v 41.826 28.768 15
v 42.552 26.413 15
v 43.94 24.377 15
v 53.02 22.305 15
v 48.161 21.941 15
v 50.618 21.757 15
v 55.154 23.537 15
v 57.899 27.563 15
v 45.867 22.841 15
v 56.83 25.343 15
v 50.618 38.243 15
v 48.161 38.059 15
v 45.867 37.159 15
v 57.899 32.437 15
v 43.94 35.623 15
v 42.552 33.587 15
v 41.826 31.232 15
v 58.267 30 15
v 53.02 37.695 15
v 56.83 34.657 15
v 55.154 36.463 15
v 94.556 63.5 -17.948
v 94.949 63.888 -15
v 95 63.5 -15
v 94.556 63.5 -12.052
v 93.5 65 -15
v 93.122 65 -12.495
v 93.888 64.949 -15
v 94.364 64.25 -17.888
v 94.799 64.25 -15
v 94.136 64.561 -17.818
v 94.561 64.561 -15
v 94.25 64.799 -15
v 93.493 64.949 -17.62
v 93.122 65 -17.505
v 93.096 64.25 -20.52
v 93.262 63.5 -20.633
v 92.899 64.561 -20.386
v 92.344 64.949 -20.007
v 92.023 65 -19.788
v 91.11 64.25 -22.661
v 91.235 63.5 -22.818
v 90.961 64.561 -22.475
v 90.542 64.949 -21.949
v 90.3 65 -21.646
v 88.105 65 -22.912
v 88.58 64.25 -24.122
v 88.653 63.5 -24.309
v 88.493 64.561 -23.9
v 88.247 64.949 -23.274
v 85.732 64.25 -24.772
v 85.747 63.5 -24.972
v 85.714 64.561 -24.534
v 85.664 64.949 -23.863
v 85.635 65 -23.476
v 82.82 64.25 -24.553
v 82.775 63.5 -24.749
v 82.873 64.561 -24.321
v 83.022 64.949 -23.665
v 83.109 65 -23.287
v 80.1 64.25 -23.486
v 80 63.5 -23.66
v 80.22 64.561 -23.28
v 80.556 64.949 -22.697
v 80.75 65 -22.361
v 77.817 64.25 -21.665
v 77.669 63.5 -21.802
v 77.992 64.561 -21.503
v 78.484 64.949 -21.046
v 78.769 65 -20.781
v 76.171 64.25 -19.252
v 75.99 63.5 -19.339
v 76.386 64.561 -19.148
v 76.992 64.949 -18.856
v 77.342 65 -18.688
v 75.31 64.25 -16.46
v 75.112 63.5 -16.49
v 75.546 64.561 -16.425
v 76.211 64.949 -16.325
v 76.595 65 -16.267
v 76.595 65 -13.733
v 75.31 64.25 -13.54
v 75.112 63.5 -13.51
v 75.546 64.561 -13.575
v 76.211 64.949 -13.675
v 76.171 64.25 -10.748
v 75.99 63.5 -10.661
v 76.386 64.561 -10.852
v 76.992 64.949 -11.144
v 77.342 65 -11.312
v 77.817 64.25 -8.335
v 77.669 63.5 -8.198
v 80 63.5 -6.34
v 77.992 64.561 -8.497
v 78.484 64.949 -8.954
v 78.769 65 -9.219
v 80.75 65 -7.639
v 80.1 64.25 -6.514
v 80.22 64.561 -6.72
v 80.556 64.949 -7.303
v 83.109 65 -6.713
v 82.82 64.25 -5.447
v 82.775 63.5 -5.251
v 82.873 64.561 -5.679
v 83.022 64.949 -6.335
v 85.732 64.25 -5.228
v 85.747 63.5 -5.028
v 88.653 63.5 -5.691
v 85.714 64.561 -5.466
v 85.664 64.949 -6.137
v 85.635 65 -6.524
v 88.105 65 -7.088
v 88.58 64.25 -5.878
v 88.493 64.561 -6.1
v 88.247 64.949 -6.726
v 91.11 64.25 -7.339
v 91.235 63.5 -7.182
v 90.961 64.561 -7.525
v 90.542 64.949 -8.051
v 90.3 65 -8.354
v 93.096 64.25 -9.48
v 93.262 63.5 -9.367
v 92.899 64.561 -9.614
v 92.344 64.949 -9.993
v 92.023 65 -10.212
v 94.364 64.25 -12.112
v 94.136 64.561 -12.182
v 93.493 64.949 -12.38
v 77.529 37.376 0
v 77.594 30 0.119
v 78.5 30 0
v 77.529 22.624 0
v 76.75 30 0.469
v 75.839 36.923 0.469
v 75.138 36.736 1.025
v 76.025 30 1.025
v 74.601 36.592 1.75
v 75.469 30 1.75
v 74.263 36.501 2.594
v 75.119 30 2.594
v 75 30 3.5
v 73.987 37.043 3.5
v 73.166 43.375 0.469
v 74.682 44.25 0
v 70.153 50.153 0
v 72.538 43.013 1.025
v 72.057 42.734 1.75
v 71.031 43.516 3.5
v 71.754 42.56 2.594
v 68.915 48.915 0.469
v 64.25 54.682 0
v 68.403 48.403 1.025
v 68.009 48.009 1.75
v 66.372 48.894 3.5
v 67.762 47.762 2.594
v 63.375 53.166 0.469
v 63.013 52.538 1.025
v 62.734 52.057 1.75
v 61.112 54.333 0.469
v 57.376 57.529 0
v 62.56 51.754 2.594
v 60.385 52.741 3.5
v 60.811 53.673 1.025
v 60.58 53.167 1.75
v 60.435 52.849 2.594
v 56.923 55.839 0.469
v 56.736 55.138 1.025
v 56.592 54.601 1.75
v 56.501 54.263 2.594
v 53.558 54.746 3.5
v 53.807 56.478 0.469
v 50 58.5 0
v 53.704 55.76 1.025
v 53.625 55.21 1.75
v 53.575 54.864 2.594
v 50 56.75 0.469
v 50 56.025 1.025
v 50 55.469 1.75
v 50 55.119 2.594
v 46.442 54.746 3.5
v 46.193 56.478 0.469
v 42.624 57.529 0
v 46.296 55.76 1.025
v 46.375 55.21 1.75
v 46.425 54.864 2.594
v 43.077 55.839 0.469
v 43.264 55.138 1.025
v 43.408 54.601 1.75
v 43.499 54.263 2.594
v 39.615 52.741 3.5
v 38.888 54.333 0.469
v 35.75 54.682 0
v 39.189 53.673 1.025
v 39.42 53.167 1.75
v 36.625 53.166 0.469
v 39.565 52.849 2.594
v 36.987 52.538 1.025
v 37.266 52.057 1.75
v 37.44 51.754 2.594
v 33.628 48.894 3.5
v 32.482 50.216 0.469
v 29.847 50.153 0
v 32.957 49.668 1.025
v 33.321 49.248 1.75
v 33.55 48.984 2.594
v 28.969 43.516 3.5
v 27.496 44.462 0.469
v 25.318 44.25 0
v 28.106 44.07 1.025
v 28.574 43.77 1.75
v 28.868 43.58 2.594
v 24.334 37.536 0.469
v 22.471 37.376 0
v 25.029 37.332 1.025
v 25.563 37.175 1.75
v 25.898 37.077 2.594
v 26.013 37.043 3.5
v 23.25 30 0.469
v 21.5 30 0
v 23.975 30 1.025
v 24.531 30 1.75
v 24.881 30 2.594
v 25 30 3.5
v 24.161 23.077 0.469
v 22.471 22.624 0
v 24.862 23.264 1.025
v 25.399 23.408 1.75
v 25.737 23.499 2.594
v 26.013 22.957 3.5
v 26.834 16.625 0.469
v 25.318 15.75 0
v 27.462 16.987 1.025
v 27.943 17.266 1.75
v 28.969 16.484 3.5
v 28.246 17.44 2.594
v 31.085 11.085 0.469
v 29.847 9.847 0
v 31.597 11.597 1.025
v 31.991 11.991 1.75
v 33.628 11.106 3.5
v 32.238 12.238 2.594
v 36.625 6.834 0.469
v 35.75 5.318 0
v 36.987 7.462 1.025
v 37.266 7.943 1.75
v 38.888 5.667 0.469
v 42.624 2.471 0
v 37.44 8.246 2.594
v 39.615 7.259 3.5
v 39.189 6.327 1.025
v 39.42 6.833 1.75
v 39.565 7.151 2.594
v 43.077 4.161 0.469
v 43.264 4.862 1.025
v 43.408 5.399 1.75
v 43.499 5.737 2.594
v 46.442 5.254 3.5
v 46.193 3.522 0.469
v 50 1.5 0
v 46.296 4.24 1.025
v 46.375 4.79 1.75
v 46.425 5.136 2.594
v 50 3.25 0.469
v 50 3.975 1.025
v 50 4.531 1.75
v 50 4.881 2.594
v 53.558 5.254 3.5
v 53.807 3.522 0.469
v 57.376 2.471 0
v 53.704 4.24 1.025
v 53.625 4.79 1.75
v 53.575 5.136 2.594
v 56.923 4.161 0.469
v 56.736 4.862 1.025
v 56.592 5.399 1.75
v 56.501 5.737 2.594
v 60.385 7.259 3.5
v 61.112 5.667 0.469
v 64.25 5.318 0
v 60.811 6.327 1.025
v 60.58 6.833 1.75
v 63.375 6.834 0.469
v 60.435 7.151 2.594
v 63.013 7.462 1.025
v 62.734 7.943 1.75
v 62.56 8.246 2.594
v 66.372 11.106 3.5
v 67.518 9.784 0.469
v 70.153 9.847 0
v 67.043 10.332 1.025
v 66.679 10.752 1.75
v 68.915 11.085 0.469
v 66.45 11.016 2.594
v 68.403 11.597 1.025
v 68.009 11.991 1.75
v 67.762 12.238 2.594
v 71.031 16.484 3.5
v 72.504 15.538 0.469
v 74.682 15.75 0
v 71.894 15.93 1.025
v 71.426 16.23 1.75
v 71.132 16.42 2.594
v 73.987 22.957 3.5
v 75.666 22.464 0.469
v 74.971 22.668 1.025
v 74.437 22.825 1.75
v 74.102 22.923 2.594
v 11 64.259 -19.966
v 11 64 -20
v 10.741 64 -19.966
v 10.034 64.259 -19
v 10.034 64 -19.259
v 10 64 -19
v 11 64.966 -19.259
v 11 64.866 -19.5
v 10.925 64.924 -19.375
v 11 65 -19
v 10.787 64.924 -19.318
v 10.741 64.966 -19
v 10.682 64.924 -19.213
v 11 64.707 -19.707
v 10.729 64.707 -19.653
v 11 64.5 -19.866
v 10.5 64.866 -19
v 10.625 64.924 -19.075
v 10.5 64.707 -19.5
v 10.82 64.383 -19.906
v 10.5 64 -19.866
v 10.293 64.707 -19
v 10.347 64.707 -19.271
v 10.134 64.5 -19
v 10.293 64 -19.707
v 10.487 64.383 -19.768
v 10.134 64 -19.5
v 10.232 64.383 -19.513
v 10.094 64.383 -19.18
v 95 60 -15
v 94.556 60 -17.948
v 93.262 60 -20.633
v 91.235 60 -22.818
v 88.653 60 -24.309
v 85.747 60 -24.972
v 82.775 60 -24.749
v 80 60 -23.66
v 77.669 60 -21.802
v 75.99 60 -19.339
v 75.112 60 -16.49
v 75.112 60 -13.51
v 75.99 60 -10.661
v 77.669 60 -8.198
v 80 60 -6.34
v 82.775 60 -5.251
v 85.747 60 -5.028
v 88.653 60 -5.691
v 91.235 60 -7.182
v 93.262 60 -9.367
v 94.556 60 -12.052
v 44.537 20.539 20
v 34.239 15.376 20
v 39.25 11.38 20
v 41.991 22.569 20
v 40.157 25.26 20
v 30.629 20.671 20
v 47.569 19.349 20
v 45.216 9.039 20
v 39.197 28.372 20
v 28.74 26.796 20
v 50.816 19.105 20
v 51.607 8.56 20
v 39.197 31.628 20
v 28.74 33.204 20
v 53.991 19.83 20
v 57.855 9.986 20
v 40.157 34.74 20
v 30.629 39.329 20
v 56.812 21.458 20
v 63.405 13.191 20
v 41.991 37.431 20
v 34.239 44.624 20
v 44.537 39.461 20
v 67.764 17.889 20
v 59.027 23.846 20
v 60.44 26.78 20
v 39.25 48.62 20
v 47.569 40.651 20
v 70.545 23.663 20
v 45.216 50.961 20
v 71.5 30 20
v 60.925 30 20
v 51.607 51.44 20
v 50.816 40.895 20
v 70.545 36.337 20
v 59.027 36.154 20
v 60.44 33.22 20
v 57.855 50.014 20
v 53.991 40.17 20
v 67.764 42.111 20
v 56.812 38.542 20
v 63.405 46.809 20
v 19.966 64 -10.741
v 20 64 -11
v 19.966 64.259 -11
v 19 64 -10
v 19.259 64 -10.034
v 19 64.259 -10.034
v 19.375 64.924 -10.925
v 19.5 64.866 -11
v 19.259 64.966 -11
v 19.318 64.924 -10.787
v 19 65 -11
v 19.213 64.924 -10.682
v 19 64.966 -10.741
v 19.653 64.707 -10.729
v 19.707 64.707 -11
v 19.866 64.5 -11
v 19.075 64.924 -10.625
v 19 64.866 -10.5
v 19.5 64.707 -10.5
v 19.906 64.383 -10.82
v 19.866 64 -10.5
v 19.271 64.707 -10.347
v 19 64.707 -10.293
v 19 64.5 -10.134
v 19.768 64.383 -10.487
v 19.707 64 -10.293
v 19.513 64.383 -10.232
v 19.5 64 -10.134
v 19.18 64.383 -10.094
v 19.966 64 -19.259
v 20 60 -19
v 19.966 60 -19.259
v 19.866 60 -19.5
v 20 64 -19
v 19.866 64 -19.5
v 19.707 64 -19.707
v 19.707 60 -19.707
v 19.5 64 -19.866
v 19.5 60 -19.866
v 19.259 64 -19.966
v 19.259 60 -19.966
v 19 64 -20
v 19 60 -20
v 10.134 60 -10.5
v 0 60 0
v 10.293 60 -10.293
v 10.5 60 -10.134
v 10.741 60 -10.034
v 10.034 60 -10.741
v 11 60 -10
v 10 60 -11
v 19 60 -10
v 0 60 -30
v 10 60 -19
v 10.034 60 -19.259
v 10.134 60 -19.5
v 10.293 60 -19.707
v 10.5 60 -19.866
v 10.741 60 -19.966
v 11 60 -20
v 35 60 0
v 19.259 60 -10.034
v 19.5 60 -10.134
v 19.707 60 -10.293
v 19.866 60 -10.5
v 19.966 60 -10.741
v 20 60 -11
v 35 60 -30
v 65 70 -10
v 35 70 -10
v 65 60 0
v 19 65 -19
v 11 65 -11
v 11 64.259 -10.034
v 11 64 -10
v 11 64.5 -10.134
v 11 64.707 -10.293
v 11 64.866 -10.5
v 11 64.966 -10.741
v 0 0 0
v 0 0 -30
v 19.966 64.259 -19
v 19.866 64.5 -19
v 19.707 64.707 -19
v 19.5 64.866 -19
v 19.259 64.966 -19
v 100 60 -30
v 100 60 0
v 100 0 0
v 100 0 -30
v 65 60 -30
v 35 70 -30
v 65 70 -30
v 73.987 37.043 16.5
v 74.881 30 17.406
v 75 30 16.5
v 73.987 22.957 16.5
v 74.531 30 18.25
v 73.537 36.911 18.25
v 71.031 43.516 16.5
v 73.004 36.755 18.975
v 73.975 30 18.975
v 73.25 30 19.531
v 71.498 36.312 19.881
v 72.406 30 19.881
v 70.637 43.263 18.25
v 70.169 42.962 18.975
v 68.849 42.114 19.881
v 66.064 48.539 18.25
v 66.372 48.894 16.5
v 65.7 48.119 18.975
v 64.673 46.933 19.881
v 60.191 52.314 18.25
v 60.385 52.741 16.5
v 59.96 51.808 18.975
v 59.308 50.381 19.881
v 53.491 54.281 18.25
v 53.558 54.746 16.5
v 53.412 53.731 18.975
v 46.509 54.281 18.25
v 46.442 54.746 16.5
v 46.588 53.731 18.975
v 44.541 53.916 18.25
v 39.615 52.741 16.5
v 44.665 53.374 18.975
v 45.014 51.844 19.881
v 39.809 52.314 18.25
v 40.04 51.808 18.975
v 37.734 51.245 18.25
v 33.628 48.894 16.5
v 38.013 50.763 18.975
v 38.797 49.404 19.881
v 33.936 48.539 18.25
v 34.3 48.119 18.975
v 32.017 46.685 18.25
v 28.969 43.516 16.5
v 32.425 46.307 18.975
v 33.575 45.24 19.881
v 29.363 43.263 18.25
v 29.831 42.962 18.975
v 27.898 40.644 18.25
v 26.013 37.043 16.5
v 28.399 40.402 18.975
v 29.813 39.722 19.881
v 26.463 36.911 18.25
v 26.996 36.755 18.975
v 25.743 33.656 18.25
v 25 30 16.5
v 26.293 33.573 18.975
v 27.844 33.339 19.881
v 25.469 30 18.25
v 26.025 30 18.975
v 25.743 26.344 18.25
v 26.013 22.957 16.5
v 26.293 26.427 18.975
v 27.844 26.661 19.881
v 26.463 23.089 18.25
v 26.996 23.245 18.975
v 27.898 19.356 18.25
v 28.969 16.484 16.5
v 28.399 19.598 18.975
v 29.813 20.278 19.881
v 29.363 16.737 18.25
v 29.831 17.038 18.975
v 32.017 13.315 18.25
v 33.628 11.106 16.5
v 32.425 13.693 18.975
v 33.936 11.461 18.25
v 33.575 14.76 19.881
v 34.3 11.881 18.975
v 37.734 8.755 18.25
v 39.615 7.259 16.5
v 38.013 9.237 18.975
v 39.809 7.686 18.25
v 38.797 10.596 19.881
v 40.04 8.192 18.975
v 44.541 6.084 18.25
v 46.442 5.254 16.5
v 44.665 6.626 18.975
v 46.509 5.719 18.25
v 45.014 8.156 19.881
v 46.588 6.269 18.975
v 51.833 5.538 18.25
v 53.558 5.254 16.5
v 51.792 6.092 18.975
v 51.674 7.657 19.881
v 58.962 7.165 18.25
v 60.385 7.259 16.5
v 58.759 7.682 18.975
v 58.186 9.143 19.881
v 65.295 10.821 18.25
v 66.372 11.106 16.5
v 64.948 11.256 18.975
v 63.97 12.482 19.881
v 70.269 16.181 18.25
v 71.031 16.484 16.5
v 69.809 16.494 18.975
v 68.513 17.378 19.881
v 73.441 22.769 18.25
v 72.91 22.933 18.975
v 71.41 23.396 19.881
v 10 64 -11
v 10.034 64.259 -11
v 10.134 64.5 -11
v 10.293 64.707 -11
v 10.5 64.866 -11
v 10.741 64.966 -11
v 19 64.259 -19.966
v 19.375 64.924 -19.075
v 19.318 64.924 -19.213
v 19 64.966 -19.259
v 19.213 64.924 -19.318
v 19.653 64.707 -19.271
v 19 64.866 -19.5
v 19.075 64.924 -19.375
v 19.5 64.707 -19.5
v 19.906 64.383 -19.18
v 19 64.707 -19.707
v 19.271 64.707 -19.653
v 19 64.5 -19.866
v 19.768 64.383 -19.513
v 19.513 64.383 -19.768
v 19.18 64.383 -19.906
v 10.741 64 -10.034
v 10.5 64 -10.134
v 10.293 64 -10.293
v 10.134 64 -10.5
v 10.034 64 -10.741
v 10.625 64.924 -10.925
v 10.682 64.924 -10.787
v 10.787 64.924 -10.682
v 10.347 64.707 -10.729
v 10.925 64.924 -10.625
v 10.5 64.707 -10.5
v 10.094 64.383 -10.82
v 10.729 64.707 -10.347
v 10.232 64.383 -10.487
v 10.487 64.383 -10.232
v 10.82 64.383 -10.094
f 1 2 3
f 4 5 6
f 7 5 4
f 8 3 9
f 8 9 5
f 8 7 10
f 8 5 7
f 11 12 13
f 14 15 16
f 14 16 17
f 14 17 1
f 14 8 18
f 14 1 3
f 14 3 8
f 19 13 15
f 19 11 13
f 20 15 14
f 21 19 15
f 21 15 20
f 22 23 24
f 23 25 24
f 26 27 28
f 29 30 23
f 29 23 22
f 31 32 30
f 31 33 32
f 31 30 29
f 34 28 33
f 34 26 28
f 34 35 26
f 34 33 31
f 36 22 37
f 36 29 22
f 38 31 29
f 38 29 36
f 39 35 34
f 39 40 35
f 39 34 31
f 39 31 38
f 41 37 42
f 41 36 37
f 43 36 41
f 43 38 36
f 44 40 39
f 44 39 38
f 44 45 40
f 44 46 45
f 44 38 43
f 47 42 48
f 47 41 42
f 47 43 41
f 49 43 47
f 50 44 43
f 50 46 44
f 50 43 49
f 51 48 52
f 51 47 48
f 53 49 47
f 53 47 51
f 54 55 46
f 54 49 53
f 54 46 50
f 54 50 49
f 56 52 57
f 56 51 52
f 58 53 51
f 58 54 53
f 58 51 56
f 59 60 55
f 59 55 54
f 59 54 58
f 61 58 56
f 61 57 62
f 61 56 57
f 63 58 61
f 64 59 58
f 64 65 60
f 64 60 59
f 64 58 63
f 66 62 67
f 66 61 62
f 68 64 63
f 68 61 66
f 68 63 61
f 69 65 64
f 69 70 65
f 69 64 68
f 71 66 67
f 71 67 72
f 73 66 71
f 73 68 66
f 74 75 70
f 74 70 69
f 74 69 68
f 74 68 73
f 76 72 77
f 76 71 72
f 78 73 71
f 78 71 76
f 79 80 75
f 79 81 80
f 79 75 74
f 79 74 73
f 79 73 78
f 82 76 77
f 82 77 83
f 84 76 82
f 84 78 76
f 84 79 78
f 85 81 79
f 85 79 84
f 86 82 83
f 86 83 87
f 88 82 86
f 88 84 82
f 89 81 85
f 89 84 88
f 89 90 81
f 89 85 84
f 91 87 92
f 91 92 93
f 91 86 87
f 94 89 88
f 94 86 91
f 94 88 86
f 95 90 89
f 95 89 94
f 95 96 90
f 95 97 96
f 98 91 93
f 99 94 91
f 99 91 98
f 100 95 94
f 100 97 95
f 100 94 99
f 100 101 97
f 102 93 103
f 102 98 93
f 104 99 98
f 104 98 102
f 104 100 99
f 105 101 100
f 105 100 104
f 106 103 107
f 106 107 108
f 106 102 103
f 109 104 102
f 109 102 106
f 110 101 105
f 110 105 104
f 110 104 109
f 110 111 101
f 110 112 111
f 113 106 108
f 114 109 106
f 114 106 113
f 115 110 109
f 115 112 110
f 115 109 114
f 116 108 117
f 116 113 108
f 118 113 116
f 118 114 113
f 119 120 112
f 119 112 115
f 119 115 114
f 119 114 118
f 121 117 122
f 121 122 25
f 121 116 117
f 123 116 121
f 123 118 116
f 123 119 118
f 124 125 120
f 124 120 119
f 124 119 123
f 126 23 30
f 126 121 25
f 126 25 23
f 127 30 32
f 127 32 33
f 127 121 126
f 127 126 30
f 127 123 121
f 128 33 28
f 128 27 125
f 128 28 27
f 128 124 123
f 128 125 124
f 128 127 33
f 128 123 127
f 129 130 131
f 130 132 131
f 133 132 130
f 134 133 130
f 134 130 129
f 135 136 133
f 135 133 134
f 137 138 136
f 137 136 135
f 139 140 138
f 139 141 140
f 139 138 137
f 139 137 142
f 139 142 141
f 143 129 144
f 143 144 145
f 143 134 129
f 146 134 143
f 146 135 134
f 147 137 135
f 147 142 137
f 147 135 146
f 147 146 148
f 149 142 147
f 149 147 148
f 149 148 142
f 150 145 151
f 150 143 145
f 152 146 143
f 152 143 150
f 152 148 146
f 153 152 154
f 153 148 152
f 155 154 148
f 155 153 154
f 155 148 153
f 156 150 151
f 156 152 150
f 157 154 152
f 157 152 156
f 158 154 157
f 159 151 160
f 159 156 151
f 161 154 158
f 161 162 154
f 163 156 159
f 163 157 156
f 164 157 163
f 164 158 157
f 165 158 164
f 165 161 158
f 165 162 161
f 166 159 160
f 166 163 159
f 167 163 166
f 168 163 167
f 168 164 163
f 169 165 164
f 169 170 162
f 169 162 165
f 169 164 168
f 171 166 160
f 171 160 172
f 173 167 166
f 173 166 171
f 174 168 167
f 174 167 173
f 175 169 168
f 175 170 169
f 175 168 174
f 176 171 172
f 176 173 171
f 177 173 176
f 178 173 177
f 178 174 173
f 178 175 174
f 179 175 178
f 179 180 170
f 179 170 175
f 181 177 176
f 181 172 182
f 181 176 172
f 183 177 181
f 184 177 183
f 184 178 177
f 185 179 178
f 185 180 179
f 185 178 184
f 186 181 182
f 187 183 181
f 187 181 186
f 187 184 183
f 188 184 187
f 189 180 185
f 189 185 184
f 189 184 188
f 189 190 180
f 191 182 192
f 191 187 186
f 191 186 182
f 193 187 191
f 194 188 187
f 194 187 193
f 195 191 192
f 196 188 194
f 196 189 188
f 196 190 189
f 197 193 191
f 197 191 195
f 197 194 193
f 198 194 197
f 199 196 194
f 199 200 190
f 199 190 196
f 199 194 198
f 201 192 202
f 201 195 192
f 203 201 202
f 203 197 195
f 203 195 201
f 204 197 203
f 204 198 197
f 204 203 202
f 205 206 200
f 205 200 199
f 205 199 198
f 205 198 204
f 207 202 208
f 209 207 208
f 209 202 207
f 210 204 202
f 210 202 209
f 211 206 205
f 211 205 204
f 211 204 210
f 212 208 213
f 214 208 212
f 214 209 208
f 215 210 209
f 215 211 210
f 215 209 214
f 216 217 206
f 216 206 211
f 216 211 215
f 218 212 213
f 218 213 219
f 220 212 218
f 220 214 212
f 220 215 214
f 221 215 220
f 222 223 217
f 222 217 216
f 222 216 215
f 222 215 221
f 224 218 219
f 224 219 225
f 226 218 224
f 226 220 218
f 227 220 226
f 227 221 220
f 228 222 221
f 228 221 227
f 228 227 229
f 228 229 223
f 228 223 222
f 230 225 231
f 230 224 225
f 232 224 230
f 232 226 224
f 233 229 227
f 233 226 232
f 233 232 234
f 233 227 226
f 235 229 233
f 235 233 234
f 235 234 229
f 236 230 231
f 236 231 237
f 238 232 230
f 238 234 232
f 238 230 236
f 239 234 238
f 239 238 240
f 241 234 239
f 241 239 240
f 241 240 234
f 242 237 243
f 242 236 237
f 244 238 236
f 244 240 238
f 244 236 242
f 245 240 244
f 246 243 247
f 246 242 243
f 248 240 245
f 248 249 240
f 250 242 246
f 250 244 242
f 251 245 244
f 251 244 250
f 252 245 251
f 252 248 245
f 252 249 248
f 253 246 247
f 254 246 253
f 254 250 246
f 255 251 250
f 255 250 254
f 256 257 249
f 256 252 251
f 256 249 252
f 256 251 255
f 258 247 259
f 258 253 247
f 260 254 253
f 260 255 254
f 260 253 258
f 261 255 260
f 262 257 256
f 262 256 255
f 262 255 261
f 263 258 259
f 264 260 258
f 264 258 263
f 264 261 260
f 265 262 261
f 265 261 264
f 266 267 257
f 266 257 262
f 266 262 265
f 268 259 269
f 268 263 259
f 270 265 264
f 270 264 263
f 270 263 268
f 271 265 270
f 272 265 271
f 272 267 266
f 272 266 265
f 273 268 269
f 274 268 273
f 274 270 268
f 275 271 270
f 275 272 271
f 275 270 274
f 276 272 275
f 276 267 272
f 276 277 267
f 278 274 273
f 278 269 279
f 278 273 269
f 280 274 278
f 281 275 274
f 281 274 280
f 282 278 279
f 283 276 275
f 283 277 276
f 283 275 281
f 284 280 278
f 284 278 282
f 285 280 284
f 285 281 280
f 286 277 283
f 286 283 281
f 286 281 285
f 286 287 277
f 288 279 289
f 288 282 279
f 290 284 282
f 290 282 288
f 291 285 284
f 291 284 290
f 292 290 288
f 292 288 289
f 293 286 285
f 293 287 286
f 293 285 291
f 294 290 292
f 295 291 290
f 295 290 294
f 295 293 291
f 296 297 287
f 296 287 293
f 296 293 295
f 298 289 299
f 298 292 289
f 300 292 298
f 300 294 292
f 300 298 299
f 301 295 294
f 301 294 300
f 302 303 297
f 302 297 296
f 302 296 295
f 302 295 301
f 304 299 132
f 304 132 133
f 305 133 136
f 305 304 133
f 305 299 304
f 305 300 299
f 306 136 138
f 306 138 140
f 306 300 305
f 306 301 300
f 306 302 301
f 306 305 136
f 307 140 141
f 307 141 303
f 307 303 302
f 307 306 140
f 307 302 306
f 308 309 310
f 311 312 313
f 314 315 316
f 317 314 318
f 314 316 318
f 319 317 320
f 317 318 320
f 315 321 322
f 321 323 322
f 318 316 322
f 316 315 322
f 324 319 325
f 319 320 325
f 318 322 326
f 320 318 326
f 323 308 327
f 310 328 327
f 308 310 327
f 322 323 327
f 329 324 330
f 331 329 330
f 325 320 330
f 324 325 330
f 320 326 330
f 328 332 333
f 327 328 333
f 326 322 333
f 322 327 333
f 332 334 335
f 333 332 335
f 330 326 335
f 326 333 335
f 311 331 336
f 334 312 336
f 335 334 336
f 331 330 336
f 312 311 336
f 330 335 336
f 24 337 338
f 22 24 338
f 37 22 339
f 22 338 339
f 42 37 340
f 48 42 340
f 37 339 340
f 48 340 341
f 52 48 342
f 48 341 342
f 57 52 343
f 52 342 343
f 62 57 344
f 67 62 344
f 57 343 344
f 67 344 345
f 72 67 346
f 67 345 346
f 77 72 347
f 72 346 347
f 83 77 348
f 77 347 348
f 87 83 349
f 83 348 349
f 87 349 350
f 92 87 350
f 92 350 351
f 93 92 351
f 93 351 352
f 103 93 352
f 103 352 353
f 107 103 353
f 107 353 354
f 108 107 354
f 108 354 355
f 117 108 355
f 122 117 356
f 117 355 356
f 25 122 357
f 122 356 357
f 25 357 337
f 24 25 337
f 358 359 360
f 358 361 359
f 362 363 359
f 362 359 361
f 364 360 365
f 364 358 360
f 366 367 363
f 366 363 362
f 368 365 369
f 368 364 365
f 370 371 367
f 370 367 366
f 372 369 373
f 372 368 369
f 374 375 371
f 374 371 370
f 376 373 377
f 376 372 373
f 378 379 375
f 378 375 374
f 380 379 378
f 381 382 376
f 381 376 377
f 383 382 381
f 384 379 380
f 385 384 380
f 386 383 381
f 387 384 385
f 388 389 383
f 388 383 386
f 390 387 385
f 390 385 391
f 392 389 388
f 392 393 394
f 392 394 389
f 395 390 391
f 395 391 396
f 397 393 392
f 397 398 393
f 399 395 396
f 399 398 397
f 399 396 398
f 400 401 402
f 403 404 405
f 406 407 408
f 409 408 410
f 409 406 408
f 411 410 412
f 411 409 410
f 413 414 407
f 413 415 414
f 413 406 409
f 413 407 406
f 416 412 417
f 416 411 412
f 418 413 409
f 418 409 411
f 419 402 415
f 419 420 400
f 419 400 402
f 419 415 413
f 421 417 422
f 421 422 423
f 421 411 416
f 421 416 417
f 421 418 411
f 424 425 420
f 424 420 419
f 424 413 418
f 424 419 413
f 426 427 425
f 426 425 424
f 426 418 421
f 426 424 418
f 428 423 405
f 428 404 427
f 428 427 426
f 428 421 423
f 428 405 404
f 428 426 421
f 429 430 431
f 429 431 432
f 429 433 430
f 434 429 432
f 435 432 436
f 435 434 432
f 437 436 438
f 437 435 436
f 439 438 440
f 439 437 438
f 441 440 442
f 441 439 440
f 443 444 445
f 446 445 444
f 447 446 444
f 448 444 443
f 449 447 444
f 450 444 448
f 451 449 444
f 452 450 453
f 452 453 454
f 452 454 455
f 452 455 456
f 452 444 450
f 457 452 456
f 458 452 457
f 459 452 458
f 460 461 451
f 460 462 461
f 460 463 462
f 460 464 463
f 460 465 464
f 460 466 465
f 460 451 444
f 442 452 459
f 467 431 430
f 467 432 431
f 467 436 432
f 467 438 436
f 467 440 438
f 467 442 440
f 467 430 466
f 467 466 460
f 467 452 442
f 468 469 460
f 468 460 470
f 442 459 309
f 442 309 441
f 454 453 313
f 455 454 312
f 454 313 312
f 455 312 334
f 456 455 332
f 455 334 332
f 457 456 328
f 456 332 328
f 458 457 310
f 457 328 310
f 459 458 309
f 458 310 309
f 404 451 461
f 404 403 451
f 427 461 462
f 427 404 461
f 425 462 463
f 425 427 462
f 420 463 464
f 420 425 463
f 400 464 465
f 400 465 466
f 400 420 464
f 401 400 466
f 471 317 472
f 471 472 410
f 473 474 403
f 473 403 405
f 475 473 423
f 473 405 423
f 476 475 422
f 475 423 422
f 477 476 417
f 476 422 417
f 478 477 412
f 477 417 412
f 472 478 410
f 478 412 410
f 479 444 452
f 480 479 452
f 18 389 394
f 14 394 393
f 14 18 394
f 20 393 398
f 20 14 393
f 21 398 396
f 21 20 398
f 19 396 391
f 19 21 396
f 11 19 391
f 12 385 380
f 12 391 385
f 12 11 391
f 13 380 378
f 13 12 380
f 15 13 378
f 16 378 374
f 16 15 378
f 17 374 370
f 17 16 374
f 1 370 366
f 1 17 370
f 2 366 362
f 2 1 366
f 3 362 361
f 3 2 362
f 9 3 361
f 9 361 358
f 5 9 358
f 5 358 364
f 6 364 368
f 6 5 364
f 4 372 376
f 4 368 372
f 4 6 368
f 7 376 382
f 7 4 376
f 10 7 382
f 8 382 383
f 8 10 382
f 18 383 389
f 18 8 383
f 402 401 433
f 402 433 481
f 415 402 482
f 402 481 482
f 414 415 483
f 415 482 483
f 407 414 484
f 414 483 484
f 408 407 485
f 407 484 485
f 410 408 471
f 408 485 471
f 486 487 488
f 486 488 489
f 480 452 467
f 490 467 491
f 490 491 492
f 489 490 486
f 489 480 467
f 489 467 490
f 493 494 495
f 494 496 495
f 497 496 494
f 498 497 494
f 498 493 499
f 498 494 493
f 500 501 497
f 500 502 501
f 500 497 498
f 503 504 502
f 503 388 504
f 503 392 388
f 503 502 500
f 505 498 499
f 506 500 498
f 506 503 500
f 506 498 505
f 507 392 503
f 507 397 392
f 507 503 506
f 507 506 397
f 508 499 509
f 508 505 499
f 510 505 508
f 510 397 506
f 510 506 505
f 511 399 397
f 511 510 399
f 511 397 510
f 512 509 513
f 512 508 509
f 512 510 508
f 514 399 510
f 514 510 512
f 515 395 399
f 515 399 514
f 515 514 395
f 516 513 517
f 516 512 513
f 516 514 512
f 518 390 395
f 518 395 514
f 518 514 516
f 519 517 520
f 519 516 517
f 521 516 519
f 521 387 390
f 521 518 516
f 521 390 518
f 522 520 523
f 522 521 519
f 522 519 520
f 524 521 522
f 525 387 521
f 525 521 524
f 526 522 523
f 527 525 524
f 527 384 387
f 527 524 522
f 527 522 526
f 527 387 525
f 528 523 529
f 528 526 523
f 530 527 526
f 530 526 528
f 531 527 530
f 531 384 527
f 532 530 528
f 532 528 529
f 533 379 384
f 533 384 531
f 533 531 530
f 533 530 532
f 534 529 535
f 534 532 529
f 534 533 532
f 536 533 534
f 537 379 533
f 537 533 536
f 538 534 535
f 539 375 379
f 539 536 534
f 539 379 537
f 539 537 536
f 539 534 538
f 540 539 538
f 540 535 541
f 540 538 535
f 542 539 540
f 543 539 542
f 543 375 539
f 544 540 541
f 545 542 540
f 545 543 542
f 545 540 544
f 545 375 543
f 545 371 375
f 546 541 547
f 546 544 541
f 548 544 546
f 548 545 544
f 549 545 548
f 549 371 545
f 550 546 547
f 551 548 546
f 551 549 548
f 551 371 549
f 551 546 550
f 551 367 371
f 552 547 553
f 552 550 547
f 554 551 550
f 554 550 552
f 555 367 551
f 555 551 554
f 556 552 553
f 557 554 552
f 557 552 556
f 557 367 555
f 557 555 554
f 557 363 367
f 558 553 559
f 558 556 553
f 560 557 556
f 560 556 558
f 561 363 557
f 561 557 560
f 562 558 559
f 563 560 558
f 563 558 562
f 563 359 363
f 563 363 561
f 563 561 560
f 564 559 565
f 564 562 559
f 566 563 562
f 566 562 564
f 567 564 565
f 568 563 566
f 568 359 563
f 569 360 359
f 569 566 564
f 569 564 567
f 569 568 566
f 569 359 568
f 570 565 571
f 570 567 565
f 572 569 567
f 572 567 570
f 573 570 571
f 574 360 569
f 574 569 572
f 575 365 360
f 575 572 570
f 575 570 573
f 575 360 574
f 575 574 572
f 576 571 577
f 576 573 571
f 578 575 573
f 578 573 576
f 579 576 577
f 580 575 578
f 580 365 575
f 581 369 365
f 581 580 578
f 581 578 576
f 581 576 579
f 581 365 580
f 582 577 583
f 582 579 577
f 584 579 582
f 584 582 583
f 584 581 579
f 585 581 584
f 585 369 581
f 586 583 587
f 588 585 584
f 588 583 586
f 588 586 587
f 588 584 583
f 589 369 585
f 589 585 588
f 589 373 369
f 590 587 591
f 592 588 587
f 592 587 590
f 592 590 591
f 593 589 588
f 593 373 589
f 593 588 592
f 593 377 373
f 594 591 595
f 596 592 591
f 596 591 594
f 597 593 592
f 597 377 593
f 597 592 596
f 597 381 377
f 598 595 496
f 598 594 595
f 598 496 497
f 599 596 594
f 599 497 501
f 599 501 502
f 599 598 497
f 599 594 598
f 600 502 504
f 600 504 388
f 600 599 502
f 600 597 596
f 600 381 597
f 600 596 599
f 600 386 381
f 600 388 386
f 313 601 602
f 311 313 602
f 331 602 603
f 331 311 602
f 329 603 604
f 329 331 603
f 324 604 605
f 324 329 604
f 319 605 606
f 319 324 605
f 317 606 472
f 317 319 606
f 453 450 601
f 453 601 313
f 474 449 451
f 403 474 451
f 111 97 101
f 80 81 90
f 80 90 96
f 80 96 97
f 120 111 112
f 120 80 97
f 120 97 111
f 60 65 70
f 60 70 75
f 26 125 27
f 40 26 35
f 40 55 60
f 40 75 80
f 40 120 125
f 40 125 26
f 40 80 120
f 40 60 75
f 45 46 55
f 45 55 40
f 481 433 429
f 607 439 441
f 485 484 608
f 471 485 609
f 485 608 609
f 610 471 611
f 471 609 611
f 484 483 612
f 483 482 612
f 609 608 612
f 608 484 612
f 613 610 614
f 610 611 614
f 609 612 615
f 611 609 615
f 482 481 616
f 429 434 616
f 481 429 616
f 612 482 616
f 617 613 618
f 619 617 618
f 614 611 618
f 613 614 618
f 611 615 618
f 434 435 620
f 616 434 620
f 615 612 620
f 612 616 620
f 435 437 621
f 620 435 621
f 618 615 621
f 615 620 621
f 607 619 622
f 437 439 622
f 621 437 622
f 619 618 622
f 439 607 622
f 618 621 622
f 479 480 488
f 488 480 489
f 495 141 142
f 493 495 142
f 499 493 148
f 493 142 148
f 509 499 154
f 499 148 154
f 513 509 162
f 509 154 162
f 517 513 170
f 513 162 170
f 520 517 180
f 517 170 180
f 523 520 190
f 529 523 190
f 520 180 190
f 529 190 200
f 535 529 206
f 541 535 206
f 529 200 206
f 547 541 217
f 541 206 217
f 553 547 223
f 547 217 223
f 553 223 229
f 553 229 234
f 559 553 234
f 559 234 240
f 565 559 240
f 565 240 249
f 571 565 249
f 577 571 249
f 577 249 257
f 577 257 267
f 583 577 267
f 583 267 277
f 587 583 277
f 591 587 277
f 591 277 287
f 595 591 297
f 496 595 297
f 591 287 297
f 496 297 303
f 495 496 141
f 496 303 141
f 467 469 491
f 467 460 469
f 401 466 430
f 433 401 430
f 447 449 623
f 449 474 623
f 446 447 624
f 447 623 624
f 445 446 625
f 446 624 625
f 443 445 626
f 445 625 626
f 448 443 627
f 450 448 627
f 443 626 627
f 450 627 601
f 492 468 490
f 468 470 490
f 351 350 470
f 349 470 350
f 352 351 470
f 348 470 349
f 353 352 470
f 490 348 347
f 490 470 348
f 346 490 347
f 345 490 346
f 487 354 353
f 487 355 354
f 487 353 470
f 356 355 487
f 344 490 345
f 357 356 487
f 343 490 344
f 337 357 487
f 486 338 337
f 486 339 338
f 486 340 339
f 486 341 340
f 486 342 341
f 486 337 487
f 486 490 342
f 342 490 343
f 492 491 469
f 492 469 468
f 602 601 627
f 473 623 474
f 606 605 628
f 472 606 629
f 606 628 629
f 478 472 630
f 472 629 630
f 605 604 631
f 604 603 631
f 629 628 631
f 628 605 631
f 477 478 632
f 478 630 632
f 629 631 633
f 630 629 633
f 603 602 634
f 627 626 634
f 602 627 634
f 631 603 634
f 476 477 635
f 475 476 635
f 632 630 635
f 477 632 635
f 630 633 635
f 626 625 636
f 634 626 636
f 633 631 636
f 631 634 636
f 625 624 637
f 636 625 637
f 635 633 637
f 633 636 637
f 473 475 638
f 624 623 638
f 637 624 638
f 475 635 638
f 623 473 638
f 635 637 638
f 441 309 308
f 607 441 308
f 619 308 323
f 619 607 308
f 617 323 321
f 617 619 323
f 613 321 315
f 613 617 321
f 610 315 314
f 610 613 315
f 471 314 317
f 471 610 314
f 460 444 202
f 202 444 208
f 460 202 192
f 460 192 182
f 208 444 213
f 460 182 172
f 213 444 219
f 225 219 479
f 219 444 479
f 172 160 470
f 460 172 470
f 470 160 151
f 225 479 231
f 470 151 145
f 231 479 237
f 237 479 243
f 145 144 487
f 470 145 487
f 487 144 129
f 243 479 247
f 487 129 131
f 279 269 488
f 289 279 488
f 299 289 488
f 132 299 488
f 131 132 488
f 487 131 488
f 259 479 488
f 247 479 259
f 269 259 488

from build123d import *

# Parameters (mm, degrees)
SKETCH1_W           = 100
SKETCH1_H           = 30
BOSS_EXTRUDE1_DEPTH = 60
SKETCH2_R           = 25
BOSS_EXTRUDE2_DEPTH = 20
SKETCH3_R           = 10
SKETCH3_W           = 10
SKETCH3_H           = 10
BOSS_EXTRUDE3_DEPTH = 5
SKETCH4_W           = 30
SKETCH4_H           = 30
BOSS_EXTRUDE4_DEPTH = 10
CHAMFER1_SIZE       = 10
FILLET1_R           = 1
FILLET2_R           = 1.5
FILLET3_R           = 3.5
SKETCH5_R           = 10.925128043
CUT_EXTRUDE1_DEPTH  = 5
CUT_EXTRUDE1_TAPER  = 28


with BuildPart() as part:
    # Sketch1 → Boss-Extrude1 (new body)
    with BuildSketch(Plane(origin=(0, 0, 0), x_dir=(1, 0, 0), z_dir=(0, 1, 0))):
        with Locations((50, 15)):
            Rectangle(SKETCH1_W, SKETCH1_H)
    extrude(amount=BOSS_EXTRUDE1_DEPTH)

    # Sketch2 → Boss-Extrude2 (add)
    with BuildSketch(Plane.XY):
        with Locations((50, 30)):
            Circle(SKETCH2_R)
    extrude(amount=BOSS_EXTRUDE2_DEPTH)

    # Sketch3 → Boss-Extrude3 (add)
    with BuildSketch(Plane(origin=(0, 60, 0), x_dir=(1, 0, 0), z_dir=(0, 1, 0))):
        with Locations((85, 15)):
            Circle(SKETCH3_R)
        with Locations((15, 15)):
            Rectangle(SKETCH3_W, SKETCH3_H)
    extrude(amount=BOSS_EXTRUDE3_DEPTH)

    # Sketch4 → Boss-Extrude4 (add)
    with BuildSketch(Plane(origin=(0, 60, 0), x_dir=(1, 0, 0), z_dir=(0, 1, 0))):
        with Locations((50, 15)):
            Rectangle(SKETCH4_W, SKETCH4_H)
    extrude(amount=BOSS_EXTRUDE4_DEPTH)

    # Chamfer1
    chamfer1_edges = [part.edges().sort_by_distance(p)[0] for p in [
        (50, 70, 0),
    ]]
    chamfer(chamfer1_edges, length=CHAMFER1_SIZE)

    # Fillet1
    fillet1_edges = [part.edges().sort_by_distance(p)[0] for p in [
        (20, 62.5, -10),
        (20, 62.5, -20),
        (10, 62.5, -20),
        (10, 62.5, -10),
        (20, 65, -15),
        (15, 65, -20),
        (10, 65, -15),
        (15, 65, -10),
    ]]
    fillet(fillet1_edges, radius=FILLET1_R)

    # Fillet2
    fillet2_edges = [part.edges().sort_by_distance(p)[0] for p in [
        (75, 65, -15),
    ]]
    fillet(fillet2_edges, radius=FILLET2_R)

    # Fillet3
    fillet3_edges = [part.edges().sort_by_distance(p)[0] for p in [
        (25, 30, 0),
        (25, 30, 20),
    ]]
    fillet(fillet3_edges, radius=FILLET3_R)

    # Sketch5 → Cut-Extrude1 (cut)
    with BuildSketch(Plane.XY.offset(20)):
        with Locations((50, 30)):
            Circle(SKETCH5_R)
    extrude(amount=-CUT_EXTRUDE1_DEPTH, taper=CUT_EXTRUDE1_TAPER, mode=Mode.SUBTRACT)


solid = part.part
